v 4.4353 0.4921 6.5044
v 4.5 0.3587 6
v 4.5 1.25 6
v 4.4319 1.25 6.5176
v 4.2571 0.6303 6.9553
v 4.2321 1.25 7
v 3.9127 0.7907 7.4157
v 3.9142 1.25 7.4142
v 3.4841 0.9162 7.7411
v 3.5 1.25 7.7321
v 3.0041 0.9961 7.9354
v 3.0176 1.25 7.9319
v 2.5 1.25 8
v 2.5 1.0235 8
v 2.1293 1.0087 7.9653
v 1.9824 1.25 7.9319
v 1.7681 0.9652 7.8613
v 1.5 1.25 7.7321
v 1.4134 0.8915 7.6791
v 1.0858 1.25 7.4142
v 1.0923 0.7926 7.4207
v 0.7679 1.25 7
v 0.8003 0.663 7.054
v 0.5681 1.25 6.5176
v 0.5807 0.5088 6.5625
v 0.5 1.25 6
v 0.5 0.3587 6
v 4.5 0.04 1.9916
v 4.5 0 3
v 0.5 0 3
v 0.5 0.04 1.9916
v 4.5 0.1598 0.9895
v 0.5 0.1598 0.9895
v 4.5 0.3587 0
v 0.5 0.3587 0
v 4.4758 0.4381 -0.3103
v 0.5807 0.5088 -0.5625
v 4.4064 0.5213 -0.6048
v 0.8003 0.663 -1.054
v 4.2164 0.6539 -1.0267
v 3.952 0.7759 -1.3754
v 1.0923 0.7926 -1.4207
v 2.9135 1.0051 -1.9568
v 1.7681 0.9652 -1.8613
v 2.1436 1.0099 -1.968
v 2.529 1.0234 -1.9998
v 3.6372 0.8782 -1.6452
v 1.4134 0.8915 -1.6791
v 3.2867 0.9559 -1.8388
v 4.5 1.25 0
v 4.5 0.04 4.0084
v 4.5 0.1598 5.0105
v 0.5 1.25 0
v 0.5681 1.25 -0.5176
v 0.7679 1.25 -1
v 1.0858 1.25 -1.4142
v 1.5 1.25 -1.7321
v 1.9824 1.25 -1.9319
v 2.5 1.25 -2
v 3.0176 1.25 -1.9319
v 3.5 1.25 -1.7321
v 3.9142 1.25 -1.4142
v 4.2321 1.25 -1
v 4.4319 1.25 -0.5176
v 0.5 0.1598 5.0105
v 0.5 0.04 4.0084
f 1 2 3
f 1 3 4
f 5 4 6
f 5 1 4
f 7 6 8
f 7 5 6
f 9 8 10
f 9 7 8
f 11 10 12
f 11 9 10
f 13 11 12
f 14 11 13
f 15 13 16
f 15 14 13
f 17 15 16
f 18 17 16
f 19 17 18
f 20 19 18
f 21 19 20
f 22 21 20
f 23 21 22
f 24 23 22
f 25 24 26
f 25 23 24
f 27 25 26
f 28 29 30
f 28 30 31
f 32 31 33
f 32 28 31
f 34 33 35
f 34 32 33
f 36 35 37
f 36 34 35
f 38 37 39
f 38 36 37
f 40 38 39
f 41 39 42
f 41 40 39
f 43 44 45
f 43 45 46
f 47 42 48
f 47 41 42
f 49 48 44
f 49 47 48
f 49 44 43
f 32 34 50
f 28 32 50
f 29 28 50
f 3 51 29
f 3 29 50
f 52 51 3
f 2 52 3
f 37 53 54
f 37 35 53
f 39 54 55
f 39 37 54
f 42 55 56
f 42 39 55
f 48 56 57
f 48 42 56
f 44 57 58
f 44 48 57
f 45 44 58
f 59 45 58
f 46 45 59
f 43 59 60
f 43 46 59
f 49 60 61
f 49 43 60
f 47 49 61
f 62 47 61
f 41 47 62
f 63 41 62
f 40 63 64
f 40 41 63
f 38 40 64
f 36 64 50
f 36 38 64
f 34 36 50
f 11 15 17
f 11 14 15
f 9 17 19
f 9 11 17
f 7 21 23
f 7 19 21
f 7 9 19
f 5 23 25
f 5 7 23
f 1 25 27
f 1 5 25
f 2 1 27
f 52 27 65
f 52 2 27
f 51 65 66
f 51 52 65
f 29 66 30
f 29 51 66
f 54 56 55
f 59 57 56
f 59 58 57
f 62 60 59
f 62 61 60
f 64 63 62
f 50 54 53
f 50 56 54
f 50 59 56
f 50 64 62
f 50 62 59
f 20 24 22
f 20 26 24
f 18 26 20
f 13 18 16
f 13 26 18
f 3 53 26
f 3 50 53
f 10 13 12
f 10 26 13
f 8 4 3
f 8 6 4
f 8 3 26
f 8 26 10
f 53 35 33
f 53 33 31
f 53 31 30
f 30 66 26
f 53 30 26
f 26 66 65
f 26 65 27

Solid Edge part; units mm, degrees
sketch "Sketch1" plane through (0, 0, 0) normal (0, -1, 0) x (1, 0, 0)
  line L0 (0, 0) -> (0, 6)
  arc A0 (0, 6) -> (5, 6) centre (2.5, 6) cw
  line L1 (5, 6) -> (5, 0)
  arc A1 (0, 0) -> (5, 0) centre (2.5, 0) ccw
extrude "Protrusion1" add sketch "Sketch1" against normal blind 2
sketch "Sketch2" plane through (5, 1, 3) normal (1, 0, 0) x (0, 1, 0)
  line L0 (1, 5.5) -> (0.25, 5.5)
  arc A0 (0.25, 5.5) -> (0.25, -5.5) centre (11.725, 0) ccw
  line L1 (1, -5.5) -> (0.25, -5.5)
  line L2 (1, 5.5) -> (1, -5.5)
extrude "ExtrudedCutout_1" cut sketch "Sketch2" against normal blind 43.2268 flip side to cut
sketch "Sketch3" plane through (2.5, 0, 3) normal (0, -1, 0) x (0, 0, 1)
  arc A0 (-3, 2) -> (-3, -2) centre (-3, 0) ccw
  line L0 (-3, -2) -> (3, -2)
  arc A1 (3, 2) -> (3, -2) centre (3, 0) cw
  line L1 (-3, 2) -> (3, 2)
extrude "ExtrudedCutout_2" cut sketch "Sketch3" against normal blind 3.7815 flip side to cut
sketch "Sketch4" plane through (4.5, 1, 3) normal (1, 0, 0) x (0, 0, 1)
  line L0 (-5, -1) -> (-5, -0.25)
  line L1 (-5, -0.25) -> (5, -0.25)
  line L2 (5, -0.25) -> (5, -1)
  line L3 (5, -1) -> (-5, -1)
extrude "ExtrudedCutout_3" cut sketch "Sketch4" against normal blind 4.4511
properties material "Glass, general industrial"
